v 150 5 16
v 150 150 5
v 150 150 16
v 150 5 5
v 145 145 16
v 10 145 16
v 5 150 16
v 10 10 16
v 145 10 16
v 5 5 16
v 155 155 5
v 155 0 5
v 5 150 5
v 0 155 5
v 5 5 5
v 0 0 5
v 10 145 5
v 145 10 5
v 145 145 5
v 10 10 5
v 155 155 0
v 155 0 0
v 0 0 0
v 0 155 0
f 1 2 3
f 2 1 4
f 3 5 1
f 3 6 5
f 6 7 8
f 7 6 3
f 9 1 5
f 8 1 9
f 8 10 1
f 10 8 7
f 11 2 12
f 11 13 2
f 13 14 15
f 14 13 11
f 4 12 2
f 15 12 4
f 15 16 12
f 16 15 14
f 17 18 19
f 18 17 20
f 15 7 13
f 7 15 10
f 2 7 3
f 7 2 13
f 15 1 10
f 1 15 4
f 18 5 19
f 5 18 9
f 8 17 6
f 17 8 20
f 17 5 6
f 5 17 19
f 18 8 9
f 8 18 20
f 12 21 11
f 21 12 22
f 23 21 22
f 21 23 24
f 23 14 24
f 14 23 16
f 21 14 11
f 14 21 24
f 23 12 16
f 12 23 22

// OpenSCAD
top_width = 155;
inside_width = 145;
lip_width = 5;
top_height = 5;
height = 16;

union() {
    cube([top_width, top_width, top_height]);
    inside_offset = (top_width - inside_width) / 2;
    translate([inside_offset, inside_offset, top_height]) {
        difference() {
            cube([inside_width, inside_width, height - top_height]);
            translate([lip_width, lip_width, 0]) {
                cube([inside_width - lip_width * 2, inside_width - lip_width * 2, height - top_height]);
            }
        }
    }
}
